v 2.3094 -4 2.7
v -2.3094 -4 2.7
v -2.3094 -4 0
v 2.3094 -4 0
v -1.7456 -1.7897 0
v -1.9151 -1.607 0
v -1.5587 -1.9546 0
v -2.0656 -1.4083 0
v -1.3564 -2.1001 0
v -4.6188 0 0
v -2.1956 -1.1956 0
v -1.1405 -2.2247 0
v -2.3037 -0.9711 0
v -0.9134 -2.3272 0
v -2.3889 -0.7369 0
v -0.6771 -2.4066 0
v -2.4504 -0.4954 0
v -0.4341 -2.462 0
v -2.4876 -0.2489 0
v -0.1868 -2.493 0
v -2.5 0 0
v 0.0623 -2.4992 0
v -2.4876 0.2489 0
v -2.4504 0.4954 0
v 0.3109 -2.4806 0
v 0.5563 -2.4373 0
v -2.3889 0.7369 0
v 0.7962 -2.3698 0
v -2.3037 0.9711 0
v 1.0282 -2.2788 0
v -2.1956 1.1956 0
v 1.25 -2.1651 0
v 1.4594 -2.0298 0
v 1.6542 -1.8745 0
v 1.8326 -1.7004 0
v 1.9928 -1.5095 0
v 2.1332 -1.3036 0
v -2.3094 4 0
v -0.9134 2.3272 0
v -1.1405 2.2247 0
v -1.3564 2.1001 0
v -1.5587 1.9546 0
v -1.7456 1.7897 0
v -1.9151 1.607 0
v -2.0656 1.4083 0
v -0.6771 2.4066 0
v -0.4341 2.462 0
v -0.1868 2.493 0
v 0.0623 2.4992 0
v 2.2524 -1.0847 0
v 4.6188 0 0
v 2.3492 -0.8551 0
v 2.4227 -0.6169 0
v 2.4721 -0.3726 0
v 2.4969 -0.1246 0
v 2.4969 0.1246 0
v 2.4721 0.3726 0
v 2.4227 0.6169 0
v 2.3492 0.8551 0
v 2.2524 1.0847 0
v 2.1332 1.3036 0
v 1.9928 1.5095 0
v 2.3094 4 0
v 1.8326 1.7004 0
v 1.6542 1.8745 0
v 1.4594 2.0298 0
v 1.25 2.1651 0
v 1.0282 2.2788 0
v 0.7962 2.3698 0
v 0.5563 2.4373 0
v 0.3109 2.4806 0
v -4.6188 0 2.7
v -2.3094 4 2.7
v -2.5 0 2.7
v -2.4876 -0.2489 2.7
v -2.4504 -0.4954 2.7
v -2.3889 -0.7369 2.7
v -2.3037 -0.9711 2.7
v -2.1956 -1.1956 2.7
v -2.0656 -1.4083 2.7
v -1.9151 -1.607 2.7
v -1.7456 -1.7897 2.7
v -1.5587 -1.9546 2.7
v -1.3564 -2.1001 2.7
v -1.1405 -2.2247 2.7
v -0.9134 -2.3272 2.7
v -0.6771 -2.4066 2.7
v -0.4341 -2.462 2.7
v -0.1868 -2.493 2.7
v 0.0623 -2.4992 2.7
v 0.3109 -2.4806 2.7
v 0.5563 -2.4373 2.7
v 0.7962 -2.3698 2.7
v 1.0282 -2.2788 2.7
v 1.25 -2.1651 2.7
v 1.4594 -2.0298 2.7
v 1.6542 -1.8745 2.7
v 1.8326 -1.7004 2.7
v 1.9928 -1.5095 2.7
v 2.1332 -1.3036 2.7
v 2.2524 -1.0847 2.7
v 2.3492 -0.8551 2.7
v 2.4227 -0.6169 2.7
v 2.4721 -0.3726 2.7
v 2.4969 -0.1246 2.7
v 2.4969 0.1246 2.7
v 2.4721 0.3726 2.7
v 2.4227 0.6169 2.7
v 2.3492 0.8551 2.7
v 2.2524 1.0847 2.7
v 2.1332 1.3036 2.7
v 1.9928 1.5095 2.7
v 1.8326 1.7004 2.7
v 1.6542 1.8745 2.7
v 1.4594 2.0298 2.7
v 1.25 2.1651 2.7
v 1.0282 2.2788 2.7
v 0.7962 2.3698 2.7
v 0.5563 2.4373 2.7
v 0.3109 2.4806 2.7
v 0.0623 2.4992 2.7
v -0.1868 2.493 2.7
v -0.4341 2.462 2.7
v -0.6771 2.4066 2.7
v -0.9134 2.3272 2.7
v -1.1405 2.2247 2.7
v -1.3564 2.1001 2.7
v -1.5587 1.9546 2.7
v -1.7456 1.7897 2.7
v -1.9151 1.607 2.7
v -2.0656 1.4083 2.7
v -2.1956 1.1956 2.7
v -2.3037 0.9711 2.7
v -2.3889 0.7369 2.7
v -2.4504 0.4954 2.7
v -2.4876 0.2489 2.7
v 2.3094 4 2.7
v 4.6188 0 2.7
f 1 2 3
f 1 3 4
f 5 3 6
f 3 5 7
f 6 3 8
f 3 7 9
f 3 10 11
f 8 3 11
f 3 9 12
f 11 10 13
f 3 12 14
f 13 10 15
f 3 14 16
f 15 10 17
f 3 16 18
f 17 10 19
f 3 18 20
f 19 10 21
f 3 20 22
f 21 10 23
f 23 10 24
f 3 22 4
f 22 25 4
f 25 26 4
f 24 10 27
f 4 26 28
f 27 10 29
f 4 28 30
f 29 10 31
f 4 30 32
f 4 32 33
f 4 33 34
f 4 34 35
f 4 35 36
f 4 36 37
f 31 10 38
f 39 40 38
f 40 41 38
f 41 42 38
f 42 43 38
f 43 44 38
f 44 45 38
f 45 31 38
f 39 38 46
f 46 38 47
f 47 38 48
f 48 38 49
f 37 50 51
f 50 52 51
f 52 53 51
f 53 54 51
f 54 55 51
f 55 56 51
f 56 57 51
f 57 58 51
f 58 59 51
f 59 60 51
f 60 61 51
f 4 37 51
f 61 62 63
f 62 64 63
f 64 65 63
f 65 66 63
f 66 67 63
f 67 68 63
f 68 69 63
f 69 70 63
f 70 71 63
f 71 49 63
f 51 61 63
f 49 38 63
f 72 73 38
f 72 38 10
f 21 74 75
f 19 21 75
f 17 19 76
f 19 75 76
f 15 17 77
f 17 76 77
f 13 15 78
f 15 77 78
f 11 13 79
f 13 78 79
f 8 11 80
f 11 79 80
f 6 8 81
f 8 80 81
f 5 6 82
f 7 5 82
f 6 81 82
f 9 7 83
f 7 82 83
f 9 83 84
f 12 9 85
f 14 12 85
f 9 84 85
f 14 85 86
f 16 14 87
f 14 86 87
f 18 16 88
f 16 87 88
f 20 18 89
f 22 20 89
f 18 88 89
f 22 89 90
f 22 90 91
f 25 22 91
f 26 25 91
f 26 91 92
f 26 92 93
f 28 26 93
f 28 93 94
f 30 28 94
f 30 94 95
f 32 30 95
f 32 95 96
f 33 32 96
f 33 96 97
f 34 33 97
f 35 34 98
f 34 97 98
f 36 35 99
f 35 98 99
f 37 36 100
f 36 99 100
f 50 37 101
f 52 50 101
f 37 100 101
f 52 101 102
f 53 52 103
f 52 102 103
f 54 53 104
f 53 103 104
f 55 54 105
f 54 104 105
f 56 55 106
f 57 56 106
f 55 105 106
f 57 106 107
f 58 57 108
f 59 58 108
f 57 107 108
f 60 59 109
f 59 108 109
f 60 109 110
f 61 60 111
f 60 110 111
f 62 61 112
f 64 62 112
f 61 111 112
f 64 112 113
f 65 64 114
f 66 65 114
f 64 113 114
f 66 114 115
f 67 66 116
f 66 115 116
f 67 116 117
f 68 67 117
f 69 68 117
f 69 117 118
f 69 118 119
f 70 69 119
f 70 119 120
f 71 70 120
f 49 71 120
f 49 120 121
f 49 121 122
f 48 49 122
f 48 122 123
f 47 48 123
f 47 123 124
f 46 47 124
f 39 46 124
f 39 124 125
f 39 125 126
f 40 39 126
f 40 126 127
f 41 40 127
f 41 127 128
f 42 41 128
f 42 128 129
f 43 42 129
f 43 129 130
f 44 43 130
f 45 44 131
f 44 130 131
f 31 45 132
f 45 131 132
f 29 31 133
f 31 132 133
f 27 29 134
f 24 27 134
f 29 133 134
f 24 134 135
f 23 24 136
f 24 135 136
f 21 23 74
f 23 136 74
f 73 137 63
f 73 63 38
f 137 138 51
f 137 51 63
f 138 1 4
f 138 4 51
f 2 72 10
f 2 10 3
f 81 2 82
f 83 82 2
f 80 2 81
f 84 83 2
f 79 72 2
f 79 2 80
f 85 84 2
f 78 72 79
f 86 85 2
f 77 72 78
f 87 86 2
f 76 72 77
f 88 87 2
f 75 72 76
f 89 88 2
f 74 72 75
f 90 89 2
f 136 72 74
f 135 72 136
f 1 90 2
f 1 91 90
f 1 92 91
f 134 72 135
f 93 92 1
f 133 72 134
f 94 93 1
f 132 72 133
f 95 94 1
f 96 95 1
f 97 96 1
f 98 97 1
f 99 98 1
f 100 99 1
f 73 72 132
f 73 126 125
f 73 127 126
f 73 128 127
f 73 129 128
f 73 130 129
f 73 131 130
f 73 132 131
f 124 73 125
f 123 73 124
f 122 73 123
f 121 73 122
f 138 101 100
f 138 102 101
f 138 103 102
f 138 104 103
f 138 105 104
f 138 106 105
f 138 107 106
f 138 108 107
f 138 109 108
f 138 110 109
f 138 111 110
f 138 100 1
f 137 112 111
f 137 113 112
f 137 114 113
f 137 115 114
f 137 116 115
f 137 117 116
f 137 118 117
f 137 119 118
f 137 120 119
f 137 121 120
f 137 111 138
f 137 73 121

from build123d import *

# Parameters (mm, degrees)
SKETCH1_R           = 2.5
BOSS_EXTRUDE1_DEPTH = 2.7


with BuildPart() as part:
    # Sketch1 → Boss-Extrude1 (new body)
    with BuildSketch(Plane.XY.offset(2.7)):
        Polygon((-2.309401077, 4), (-4.618802154, 0), (-2.309401077, -4), (2.309401077, -4), (4.618802154, 0), (2.309401077, 4), align=None)
        with Locations(Location((0, 0, 0), (0, 0, 180))):
            Circle(SKETCH1_R, mode=Mode.SUBTRACT)
    extrude(amount=-BOSS_EXTRUDE1_DEPTH)


solid = part.part
